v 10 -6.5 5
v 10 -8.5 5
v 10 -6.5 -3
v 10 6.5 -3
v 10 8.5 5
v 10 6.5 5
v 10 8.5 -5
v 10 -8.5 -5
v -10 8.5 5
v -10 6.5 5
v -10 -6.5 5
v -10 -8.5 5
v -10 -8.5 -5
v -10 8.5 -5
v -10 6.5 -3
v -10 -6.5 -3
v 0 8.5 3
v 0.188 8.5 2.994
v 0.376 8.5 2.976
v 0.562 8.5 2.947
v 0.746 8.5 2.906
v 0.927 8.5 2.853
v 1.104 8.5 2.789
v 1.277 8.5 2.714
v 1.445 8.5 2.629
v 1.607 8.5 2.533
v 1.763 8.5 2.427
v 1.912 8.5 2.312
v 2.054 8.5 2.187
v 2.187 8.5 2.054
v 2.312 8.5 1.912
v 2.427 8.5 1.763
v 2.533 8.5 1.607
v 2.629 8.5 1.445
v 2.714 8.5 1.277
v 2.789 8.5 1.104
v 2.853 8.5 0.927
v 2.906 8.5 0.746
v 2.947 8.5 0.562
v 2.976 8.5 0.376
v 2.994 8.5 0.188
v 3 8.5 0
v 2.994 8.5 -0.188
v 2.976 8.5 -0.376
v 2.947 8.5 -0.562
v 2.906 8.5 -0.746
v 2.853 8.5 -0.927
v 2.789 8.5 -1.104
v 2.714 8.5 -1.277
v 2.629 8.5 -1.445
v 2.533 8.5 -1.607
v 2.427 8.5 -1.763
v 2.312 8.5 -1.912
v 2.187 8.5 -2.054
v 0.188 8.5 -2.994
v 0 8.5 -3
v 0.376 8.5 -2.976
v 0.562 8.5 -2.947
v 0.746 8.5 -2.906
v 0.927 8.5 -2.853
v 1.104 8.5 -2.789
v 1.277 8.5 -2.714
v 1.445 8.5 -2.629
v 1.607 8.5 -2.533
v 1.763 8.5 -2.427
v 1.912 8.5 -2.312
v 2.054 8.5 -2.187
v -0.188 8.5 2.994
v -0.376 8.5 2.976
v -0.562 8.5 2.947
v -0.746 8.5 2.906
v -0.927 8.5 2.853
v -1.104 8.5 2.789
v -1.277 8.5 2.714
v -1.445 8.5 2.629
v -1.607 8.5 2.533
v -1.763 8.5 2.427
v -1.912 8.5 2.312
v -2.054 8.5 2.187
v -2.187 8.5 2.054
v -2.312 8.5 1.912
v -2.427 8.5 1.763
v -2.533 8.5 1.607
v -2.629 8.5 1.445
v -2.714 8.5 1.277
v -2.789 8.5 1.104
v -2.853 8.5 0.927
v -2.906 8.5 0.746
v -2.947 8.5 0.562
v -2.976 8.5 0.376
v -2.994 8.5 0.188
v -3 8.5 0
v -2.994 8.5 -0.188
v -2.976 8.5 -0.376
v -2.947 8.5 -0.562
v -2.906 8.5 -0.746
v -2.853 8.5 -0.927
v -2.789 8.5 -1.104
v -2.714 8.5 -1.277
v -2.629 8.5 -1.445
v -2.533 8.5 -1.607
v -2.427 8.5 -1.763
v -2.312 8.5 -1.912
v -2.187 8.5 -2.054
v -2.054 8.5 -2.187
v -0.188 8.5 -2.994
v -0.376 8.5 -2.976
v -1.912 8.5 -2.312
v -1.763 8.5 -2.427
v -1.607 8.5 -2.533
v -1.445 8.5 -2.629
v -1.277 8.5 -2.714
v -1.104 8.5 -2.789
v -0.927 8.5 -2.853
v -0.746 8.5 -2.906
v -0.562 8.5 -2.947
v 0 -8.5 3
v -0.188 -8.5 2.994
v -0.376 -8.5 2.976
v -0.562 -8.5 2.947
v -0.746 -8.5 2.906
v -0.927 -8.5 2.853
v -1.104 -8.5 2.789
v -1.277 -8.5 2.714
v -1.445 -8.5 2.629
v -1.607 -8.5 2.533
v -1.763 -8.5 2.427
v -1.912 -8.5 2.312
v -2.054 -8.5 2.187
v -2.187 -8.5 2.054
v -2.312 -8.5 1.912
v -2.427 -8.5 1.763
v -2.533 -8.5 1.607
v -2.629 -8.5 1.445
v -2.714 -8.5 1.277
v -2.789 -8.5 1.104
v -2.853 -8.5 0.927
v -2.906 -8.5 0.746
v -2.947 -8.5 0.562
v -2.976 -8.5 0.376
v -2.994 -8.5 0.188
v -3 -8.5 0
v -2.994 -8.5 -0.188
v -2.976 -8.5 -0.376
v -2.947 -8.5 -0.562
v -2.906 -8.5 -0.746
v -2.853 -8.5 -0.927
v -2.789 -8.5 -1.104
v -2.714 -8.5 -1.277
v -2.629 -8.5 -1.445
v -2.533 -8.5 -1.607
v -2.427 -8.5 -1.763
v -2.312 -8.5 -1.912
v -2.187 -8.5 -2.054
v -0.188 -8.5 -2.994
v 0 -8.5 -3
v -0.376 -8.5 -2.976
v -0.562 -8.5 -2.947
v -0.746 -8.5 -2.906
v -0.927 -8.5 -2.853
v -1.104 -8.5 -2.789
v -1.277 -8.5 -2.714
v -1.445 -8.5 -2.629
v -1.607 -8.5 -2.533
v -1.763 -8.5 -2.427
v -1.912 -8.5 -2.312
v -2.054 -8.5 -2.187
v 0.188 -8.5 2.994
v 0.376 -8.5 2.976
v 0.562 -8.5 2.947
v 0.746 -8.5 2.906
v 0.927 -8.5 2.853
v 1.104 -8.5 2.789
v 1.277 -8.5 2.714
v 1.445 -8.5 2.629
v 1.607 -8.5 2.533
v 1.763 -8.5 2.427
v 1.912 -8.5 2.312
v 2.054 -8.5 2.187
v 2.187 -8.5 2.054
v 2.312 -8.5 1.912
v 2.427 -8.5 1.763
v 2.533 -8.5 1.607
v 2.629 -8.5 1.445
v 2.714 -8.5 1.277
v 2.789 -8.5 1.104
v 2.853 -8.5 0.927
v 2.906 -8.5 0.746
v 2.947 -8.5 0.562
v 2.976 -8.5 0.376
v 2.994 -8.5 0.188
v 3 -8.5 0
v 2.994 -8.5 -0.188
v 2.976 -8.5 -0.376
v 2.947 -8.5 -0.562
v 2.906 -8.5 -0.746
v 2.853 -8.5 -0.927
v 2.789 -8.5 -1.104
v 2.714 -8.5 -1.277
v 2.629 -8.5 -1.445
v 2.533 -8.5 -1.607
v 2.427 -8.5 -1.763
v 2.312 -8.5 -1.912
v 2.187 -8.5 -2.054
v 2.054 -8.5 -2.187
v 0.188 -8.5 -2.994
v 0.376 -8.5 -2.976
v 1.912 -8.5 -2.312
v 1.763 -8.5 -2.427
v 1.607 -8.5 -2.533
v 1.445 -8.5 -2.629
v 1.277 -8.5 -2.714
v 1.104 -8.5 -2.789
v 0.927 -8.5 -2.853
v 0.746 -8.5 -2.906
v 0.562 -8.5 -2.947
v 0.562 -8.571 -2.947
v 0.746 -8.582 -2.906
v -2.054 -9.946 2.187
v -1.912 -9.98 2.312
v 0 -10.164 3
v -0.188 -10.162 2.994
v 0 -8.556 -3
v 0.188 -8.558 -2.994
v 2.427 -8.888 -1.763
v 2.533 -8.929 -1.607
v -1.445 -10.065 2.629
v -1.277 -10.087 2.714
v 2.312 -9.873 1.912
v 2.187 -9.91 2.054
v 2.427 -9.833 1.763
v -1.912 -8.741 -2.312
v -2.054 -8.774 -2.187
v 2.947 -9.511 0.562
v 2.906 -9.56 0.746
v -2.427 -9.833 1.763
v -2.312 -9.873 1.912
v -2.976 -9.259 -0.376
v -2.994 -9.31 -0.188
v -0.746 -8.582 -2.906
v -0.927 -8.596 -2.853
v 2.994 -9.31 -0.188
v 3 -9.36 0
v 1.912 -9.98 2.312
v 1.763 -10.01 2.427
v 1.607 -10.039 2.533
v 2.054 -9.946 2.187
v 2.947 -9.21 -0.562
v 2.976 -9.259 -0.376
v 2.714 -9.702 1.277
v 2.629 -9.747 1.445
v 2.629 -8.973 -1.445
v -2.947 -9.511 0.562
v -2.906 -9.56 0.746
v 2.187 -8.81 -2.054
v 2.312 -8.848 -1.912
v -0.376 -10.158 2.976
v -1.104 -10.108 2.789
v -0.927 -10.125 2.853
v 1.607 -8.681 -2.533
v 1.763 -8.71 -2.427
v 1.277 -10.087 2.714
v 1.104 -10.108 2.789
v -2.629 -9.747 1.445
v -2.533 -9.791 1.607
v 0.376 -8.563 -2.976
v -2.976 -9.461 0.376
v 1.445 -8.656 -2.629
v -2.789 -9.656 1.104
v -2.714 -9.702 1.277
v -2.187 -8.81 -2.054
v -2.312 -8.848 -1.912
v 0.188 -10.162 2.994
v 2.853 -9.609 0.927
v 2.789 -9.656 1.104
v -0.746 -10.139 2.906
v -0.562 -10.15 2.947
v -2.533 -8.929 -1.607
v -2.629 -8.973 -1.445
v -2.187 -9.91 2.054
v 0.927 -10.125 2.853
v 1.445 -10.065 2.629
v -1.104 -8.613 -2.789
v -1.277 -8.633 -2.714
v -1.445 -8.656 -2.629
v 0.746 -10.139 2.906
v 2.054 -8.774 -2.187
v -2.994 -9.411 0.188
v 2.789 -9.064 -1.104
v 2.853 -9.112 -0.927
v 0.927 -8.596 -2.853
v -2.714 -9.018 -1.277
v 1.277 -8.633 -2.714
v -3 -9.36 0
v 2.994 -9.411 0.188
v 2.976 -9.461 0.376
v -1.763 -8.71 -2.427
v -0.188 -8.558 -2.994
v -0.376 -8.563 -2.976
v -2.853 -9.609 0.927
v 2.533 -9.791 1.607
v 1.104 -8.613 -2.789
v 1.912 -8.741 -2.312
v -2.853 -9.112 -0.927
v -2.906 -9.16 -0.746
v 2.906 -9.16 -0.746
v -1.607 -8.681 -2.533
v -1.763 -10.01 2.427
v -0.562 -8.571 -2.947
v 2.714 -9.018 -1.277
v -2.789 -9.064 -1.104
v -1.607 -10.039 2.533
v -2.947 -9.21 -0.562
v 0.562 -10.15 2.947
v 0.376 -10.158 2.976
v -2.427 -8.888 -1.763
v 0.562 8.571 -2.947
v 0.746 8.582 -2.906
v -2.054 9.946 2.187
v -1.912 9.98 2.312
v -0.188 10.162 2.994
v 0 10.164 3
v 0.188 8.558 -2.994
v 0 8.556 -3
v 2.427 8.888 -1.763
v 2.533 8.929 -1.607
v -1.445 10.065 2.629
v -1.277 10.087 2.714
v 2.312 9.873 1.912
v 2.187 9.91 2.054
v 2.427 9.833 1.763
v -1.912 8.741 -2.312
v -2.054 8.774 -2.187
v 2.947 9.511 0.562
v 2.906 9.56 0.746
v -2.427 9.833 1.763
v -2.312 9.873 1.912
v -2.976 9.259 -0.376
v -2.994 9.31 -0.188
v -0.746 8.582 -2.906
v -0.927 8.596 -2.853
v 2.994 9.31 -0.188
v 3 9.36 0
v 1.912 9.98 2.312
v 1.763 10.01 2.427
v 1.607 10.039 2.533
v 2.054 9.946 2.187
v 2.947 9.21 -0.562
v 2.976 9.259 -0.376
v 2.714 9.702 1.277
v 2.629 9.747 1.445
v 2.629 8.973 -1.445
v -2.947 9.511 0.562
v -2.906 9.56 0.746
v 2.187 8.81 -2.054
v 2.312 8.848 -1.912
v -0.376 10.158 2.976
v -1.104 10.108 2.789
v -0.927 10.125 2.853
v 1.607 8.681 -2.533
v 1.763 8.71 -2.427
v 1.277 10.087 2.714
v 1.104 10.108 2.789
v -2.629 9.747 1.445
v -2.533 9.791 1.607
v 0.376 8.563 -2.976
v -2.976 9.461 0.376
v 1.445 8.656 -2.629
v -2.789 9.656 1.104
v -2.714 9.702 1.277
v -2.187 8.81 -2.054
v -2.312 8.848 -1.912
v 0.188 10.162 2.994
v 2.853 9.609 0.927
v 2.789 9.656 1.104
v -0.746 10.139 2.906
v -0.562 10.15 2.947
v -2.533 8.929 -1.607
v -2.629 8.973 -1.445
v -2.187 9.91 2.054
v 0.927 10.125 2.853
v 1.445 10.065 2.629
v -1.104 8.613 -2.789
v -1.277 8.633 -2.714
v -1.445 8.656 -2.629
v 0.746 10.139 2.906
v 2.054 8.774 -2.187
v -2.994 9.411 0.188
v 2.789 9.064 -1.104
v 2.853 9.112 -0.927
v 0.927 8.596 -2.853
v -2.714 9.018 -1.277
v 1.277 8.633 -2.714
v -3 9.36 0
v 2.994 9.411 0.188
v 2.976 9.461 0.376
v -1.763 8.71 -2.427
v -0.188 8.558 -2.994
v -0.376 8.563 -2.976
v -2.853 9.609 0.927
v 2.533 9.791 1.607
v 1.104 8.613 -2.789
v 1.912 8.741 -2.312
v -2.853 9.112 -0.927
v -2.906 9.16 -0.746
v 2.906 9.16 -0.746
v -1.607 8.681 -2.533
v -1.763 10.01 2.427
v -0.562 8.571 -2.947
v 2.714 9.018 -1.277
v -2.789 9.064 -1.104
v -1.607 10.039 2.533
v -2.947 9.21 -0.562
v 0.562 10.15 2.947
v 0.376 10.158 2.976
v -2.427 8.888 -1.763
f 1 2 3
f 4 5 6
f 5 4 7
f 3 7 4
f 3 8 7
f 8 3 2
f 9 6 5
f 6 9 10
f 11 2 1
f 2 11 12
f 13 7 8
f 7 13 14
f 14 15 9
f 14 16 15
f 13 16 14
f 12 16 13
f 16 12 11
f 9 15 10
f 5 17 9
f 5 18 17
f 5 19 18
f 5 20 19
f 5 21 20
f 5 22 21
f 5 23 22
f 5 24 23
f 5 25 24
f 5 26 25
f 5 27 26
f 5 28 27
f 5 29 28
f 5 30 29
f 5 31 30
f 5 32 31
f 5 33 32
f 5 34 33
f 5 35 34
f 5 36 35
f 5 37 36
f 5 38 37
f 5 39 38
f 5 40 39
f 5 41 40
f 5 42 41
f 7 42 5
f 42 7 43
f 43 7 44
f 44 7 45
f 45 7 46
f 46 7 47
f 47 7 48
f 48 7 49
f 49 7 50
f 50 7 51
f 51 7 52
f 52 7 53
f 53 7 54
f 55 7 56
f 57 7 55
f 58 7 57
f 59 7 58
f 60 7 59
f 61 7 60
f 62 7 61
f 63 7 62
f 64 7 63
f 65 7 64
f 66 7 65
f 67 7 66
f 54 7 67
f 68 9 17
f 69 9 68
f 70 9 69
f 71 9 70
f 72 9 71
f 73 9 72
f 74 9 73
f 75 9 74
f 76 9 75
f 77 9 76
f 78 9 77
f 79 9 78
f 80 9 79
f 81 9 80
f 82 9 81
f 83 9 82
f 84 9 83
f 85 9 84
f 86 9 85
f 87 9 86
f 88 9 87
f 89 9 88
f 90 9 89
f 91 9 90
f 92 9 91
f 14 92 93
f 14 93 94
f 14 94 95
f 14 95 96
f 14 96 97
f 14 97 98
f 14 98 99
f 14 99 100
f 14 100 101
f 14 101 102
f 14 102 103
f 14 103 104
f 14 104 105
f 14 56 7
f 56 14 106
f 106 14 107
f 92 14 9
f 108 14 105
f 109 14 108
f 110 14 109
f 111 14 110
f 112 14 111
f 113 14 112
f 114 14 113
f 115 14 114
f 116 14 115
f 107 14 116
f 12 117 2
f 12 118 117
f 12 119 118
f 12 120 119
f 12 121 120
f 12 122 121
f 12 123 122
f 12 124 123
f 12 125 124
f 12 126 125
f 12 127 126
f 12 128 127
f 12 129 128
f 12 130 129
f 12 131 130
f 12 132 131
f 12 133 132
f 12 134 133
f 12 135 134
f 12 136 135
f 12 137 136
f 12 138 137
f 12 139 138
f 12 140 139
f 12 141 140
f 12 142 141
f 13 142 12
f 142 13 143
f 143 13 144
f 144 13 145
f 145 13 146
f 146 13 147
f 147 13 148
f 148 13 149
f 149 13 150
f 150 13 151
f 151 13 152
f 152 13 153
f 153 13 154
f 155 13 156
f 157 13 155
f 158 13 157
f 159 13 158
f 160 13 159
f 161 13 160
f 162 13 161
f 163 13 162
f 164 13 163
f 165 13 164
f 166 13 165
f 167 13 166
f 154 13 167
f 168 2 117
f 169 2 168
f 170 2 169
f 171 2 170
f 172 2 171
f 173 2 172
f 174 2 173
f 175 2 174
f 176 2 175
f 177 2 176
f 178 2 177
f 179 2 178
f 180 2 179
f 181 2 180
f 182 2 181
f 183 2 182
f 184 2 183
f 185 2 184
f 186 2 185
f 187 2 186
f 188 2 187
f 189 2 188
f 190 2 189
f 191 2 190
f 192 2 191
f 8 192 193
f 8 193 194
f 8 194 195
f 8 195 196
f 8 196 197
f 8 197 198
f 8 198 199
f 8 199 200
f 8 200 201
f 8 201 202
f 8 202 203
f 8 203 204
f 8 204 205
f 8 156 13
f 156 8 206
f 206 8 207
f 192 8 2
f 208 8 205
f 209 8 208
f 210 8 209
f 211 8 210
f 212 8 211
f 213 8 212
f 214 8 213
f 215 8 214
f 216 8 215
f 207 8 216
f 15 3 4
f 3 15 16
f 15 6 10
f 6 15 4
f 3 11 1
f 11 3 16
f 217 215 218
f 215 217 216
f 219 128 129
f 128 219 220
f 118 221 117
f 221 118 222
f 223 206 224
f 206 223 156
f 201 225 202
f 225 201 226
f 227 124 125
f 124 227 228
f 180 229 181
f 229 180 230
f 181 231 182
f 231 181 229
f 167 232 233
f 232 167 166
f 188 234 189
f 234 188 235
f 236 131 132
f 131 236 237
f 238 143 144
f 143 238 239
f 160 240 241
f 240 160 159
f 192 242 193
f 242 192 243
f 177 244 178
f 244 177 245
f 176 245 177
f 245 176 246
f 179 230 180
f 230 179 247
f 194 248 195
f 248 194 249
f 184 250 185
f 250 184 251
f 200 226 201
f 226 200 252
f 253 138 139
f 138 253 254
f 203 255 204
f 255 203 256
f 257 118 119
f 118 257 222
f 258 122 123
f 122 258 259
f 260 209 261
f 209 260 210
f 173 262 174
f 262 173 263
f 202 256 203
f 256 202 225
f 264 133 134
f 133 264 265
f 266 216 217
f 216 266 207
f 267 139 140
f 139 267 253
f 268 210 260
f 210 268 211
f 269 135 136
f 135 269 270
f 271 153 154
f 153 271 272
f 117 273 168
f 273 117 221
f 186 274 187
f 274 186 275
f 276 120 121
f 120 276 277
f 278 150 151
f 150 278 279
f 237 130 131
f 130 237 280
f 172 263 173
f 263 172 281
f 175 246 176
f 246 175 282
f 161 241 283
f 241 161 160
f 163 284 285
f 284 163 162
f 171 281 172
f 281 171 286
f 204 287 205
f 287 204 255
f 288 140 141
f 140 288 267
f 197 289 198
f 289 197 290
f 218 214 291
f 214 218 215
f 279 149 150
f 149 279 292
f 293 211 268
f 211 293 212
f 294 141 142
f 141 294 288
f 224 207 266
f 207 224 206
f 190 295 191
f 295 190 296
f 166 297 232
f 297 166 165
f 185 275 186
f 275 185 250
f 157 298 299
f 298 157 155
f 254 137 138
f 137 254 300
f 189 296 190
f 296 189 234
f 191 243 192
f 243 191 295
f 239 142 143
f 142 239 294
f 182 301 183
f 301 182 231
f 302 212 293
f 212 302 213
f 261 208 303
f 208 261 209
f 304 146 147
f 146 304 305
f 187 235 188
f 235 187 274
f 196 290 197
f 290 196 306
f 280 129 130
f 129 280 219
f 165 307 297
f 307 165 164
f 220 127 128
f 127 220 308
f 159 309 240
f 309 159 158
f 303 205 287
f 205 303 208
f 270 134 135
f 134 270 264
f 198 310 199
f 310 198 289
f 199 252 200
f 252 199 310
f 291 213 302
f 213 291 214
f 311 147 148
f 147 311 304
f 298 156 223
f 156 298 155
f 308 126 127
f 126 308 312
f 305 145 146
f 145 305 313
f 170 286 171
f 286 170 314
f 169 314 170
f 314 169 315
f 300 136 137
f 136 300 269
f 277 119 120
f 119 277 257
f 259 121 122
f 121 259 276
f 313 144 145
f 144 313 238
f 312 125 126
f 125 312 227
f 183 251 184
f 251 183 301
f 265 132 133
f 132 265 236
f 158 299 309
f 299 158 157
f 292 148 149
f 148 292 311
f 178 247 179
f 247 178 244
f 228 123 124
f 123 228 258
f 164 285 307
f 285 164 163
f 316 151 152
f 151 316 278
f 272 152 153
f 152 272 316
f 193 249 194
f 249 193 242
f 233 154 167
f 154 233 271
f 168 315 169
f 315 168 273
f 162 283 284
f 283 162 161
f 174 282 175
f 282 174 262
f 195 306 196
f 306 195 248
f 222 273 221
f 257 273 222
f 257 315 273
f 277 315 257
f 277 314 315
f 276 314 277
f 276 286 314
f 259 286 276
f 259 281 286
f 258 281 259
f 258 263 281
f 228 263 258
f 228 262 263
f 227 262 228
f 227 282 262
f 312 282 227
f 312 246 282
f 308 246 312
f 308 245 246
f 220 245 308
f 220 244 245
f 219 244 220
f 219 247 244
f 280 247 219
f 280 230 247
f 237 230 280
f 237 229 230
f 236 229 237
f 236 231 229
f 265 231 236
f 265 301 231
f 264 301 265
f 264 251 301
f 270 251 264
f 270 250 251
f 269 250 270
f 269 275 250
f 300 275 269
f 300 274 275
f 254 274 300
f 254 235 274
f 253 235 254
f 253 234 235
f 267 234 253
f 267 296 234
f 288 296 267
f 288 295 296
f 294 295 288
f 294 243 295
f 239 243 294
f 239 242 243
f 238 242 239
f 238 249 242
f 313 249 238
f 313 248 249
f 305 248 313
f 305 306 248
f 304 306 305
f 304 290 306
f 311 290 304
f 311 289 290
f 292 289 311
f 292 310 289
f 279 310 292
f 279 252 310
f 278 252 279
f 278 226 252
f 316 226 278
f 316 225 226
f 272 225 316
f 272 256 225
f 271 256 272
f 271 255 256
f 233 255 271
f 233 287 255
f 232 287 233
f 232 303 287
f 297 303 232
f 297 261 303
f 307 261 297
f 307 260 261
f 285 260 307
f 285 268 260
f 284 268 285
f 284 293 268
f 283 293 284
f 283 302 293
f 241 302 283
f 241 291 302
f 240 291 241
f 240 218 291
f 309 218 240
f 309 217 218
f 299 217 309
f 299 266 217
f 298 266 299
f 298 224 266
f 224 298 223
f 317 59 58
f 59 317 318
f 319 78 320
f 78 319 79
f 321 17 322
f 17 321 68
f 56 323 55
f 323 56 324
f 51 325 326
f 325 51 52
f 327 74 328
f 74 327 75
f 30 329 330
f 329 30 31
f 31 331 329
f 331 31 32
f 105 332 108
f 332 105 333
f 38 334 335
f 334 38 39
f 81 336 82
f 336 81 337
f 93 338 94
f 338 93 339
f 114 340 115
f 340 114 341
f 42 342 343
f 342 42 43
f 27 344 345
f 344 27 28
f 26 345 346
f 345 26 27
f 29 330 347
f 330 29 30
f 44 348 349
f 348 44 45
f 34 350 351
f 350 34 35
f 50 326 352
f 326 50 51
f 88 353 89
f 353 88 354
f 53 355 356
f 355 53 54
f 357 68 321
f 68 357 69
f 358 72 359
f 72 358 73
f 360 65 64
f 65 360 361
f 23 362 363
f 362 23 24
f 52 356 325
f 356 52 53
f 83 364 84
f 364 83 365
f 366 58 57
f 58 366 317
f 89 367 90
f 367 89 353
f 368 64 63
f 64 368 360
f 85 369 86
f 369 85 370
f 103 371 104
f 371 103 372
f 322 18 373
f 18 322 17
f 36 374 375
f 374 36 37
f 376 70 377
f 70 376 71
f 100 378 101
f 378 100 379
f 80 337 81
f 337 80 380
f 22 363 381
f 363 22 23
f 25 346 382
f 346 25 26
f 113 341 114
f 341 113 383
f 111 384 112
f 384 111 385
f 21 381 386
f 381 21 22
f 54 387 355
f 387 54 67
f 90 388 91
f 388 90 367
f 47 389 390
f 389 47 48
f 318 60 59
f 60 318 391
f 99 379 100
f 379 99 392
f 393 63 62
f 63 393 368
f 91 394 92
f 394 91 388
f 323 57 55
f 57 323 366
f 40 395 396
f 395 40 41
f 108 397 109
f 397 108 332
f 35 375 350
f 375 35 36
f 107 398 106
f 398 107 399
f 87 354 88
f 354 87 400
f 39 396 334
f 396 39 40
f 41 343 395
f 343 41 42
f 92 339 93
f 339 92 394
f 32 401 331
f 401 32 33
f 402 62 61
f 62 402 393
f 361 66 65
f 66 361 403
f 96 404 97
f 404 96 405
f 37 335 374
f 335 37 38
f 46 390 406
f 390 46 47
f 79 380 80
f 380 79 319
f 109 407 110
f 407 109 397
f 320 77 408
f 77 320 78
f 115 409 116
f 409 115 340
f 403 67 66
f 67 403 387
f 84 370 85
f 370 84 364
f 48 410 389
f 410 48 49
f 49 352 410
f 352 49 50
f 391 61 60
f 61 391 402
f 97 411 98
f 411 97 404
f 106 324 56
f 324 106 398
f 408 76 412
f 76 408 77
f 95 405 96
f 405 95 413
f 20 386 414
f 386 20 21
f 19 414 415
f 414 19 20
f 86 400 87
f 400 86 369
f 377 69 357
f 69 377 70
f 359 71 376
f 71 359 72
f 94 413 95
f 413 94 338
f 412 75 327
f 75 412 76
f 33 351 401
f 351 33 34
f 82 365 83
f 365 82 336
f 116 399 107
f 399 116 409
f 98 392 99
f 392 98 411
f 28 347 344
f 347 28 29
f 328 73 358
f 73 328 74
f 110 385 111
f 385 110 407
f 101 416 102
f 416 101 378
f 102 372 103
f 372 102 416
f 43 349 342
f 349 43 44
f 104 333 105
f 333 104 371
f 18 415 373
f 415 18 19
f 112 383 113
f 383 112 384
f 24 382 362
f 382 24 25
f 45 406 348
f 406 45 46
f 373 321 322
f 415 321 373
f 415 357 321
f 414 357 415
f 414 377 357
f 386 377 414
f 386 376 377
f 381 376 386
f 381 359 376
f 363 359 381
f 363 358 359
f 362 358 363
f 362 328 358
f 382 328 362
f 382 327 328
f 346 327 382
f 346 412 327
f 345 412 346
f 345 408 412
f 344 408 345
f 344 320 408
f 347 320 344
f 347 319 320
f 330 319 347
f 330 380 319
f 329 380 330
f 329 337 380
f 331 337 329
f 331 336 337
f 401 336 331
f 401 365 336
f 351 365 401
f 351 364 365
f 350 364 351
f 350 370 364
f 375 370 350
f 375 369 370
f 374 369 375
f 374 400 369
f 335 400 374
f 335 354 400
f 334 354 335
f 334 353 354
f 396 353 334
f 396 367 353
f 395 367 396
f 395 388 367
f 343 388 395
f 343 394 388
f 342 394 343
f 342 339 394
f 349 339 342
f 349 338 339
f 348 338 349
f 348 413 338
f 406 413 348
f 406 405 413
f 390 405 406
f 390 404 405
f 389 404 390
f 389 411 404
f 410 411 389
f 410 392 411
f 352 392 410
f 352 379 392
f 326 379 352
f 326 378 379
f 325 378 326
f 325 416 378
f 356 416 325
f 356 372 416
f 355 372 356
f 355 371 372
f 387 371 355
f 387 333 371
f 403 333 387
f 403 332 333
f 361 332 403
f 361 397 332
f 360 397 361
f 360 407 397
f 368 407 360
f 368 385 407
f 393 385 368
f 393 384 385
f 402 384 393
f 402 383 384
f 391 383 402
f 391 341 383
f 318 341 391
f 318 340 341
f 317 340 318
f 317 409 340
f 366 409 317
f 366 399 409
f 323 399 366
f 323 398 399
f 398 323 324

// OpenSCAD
$fn=100;

width=20;
length=17;
height=10;

border_thickness=2;
holder_radius=3;
holder_length=2;


module holder() {
    
    difference() {
        rotate([90,90,0])  cylinder(r=holder_radius, h=holder_length, center=true);

       translate([0,-5,-4])
        rotate([15,0,0])
        cube([holder_radius*4, holder_radius*4, holder_radius*4], center=true);            
 
    }
    

}

difference() {
    cube([width, length, height], center=true);
    translate([0,0,border_thickness])
    cube([width+1, length-border_thickness*2, height], center=true);
}






translate([0,-(length/2 + holder_length/2),0]) holder();

mirror([0,1,0])
translate([0,-(length/2 + holder_length/2),0]) holder();
